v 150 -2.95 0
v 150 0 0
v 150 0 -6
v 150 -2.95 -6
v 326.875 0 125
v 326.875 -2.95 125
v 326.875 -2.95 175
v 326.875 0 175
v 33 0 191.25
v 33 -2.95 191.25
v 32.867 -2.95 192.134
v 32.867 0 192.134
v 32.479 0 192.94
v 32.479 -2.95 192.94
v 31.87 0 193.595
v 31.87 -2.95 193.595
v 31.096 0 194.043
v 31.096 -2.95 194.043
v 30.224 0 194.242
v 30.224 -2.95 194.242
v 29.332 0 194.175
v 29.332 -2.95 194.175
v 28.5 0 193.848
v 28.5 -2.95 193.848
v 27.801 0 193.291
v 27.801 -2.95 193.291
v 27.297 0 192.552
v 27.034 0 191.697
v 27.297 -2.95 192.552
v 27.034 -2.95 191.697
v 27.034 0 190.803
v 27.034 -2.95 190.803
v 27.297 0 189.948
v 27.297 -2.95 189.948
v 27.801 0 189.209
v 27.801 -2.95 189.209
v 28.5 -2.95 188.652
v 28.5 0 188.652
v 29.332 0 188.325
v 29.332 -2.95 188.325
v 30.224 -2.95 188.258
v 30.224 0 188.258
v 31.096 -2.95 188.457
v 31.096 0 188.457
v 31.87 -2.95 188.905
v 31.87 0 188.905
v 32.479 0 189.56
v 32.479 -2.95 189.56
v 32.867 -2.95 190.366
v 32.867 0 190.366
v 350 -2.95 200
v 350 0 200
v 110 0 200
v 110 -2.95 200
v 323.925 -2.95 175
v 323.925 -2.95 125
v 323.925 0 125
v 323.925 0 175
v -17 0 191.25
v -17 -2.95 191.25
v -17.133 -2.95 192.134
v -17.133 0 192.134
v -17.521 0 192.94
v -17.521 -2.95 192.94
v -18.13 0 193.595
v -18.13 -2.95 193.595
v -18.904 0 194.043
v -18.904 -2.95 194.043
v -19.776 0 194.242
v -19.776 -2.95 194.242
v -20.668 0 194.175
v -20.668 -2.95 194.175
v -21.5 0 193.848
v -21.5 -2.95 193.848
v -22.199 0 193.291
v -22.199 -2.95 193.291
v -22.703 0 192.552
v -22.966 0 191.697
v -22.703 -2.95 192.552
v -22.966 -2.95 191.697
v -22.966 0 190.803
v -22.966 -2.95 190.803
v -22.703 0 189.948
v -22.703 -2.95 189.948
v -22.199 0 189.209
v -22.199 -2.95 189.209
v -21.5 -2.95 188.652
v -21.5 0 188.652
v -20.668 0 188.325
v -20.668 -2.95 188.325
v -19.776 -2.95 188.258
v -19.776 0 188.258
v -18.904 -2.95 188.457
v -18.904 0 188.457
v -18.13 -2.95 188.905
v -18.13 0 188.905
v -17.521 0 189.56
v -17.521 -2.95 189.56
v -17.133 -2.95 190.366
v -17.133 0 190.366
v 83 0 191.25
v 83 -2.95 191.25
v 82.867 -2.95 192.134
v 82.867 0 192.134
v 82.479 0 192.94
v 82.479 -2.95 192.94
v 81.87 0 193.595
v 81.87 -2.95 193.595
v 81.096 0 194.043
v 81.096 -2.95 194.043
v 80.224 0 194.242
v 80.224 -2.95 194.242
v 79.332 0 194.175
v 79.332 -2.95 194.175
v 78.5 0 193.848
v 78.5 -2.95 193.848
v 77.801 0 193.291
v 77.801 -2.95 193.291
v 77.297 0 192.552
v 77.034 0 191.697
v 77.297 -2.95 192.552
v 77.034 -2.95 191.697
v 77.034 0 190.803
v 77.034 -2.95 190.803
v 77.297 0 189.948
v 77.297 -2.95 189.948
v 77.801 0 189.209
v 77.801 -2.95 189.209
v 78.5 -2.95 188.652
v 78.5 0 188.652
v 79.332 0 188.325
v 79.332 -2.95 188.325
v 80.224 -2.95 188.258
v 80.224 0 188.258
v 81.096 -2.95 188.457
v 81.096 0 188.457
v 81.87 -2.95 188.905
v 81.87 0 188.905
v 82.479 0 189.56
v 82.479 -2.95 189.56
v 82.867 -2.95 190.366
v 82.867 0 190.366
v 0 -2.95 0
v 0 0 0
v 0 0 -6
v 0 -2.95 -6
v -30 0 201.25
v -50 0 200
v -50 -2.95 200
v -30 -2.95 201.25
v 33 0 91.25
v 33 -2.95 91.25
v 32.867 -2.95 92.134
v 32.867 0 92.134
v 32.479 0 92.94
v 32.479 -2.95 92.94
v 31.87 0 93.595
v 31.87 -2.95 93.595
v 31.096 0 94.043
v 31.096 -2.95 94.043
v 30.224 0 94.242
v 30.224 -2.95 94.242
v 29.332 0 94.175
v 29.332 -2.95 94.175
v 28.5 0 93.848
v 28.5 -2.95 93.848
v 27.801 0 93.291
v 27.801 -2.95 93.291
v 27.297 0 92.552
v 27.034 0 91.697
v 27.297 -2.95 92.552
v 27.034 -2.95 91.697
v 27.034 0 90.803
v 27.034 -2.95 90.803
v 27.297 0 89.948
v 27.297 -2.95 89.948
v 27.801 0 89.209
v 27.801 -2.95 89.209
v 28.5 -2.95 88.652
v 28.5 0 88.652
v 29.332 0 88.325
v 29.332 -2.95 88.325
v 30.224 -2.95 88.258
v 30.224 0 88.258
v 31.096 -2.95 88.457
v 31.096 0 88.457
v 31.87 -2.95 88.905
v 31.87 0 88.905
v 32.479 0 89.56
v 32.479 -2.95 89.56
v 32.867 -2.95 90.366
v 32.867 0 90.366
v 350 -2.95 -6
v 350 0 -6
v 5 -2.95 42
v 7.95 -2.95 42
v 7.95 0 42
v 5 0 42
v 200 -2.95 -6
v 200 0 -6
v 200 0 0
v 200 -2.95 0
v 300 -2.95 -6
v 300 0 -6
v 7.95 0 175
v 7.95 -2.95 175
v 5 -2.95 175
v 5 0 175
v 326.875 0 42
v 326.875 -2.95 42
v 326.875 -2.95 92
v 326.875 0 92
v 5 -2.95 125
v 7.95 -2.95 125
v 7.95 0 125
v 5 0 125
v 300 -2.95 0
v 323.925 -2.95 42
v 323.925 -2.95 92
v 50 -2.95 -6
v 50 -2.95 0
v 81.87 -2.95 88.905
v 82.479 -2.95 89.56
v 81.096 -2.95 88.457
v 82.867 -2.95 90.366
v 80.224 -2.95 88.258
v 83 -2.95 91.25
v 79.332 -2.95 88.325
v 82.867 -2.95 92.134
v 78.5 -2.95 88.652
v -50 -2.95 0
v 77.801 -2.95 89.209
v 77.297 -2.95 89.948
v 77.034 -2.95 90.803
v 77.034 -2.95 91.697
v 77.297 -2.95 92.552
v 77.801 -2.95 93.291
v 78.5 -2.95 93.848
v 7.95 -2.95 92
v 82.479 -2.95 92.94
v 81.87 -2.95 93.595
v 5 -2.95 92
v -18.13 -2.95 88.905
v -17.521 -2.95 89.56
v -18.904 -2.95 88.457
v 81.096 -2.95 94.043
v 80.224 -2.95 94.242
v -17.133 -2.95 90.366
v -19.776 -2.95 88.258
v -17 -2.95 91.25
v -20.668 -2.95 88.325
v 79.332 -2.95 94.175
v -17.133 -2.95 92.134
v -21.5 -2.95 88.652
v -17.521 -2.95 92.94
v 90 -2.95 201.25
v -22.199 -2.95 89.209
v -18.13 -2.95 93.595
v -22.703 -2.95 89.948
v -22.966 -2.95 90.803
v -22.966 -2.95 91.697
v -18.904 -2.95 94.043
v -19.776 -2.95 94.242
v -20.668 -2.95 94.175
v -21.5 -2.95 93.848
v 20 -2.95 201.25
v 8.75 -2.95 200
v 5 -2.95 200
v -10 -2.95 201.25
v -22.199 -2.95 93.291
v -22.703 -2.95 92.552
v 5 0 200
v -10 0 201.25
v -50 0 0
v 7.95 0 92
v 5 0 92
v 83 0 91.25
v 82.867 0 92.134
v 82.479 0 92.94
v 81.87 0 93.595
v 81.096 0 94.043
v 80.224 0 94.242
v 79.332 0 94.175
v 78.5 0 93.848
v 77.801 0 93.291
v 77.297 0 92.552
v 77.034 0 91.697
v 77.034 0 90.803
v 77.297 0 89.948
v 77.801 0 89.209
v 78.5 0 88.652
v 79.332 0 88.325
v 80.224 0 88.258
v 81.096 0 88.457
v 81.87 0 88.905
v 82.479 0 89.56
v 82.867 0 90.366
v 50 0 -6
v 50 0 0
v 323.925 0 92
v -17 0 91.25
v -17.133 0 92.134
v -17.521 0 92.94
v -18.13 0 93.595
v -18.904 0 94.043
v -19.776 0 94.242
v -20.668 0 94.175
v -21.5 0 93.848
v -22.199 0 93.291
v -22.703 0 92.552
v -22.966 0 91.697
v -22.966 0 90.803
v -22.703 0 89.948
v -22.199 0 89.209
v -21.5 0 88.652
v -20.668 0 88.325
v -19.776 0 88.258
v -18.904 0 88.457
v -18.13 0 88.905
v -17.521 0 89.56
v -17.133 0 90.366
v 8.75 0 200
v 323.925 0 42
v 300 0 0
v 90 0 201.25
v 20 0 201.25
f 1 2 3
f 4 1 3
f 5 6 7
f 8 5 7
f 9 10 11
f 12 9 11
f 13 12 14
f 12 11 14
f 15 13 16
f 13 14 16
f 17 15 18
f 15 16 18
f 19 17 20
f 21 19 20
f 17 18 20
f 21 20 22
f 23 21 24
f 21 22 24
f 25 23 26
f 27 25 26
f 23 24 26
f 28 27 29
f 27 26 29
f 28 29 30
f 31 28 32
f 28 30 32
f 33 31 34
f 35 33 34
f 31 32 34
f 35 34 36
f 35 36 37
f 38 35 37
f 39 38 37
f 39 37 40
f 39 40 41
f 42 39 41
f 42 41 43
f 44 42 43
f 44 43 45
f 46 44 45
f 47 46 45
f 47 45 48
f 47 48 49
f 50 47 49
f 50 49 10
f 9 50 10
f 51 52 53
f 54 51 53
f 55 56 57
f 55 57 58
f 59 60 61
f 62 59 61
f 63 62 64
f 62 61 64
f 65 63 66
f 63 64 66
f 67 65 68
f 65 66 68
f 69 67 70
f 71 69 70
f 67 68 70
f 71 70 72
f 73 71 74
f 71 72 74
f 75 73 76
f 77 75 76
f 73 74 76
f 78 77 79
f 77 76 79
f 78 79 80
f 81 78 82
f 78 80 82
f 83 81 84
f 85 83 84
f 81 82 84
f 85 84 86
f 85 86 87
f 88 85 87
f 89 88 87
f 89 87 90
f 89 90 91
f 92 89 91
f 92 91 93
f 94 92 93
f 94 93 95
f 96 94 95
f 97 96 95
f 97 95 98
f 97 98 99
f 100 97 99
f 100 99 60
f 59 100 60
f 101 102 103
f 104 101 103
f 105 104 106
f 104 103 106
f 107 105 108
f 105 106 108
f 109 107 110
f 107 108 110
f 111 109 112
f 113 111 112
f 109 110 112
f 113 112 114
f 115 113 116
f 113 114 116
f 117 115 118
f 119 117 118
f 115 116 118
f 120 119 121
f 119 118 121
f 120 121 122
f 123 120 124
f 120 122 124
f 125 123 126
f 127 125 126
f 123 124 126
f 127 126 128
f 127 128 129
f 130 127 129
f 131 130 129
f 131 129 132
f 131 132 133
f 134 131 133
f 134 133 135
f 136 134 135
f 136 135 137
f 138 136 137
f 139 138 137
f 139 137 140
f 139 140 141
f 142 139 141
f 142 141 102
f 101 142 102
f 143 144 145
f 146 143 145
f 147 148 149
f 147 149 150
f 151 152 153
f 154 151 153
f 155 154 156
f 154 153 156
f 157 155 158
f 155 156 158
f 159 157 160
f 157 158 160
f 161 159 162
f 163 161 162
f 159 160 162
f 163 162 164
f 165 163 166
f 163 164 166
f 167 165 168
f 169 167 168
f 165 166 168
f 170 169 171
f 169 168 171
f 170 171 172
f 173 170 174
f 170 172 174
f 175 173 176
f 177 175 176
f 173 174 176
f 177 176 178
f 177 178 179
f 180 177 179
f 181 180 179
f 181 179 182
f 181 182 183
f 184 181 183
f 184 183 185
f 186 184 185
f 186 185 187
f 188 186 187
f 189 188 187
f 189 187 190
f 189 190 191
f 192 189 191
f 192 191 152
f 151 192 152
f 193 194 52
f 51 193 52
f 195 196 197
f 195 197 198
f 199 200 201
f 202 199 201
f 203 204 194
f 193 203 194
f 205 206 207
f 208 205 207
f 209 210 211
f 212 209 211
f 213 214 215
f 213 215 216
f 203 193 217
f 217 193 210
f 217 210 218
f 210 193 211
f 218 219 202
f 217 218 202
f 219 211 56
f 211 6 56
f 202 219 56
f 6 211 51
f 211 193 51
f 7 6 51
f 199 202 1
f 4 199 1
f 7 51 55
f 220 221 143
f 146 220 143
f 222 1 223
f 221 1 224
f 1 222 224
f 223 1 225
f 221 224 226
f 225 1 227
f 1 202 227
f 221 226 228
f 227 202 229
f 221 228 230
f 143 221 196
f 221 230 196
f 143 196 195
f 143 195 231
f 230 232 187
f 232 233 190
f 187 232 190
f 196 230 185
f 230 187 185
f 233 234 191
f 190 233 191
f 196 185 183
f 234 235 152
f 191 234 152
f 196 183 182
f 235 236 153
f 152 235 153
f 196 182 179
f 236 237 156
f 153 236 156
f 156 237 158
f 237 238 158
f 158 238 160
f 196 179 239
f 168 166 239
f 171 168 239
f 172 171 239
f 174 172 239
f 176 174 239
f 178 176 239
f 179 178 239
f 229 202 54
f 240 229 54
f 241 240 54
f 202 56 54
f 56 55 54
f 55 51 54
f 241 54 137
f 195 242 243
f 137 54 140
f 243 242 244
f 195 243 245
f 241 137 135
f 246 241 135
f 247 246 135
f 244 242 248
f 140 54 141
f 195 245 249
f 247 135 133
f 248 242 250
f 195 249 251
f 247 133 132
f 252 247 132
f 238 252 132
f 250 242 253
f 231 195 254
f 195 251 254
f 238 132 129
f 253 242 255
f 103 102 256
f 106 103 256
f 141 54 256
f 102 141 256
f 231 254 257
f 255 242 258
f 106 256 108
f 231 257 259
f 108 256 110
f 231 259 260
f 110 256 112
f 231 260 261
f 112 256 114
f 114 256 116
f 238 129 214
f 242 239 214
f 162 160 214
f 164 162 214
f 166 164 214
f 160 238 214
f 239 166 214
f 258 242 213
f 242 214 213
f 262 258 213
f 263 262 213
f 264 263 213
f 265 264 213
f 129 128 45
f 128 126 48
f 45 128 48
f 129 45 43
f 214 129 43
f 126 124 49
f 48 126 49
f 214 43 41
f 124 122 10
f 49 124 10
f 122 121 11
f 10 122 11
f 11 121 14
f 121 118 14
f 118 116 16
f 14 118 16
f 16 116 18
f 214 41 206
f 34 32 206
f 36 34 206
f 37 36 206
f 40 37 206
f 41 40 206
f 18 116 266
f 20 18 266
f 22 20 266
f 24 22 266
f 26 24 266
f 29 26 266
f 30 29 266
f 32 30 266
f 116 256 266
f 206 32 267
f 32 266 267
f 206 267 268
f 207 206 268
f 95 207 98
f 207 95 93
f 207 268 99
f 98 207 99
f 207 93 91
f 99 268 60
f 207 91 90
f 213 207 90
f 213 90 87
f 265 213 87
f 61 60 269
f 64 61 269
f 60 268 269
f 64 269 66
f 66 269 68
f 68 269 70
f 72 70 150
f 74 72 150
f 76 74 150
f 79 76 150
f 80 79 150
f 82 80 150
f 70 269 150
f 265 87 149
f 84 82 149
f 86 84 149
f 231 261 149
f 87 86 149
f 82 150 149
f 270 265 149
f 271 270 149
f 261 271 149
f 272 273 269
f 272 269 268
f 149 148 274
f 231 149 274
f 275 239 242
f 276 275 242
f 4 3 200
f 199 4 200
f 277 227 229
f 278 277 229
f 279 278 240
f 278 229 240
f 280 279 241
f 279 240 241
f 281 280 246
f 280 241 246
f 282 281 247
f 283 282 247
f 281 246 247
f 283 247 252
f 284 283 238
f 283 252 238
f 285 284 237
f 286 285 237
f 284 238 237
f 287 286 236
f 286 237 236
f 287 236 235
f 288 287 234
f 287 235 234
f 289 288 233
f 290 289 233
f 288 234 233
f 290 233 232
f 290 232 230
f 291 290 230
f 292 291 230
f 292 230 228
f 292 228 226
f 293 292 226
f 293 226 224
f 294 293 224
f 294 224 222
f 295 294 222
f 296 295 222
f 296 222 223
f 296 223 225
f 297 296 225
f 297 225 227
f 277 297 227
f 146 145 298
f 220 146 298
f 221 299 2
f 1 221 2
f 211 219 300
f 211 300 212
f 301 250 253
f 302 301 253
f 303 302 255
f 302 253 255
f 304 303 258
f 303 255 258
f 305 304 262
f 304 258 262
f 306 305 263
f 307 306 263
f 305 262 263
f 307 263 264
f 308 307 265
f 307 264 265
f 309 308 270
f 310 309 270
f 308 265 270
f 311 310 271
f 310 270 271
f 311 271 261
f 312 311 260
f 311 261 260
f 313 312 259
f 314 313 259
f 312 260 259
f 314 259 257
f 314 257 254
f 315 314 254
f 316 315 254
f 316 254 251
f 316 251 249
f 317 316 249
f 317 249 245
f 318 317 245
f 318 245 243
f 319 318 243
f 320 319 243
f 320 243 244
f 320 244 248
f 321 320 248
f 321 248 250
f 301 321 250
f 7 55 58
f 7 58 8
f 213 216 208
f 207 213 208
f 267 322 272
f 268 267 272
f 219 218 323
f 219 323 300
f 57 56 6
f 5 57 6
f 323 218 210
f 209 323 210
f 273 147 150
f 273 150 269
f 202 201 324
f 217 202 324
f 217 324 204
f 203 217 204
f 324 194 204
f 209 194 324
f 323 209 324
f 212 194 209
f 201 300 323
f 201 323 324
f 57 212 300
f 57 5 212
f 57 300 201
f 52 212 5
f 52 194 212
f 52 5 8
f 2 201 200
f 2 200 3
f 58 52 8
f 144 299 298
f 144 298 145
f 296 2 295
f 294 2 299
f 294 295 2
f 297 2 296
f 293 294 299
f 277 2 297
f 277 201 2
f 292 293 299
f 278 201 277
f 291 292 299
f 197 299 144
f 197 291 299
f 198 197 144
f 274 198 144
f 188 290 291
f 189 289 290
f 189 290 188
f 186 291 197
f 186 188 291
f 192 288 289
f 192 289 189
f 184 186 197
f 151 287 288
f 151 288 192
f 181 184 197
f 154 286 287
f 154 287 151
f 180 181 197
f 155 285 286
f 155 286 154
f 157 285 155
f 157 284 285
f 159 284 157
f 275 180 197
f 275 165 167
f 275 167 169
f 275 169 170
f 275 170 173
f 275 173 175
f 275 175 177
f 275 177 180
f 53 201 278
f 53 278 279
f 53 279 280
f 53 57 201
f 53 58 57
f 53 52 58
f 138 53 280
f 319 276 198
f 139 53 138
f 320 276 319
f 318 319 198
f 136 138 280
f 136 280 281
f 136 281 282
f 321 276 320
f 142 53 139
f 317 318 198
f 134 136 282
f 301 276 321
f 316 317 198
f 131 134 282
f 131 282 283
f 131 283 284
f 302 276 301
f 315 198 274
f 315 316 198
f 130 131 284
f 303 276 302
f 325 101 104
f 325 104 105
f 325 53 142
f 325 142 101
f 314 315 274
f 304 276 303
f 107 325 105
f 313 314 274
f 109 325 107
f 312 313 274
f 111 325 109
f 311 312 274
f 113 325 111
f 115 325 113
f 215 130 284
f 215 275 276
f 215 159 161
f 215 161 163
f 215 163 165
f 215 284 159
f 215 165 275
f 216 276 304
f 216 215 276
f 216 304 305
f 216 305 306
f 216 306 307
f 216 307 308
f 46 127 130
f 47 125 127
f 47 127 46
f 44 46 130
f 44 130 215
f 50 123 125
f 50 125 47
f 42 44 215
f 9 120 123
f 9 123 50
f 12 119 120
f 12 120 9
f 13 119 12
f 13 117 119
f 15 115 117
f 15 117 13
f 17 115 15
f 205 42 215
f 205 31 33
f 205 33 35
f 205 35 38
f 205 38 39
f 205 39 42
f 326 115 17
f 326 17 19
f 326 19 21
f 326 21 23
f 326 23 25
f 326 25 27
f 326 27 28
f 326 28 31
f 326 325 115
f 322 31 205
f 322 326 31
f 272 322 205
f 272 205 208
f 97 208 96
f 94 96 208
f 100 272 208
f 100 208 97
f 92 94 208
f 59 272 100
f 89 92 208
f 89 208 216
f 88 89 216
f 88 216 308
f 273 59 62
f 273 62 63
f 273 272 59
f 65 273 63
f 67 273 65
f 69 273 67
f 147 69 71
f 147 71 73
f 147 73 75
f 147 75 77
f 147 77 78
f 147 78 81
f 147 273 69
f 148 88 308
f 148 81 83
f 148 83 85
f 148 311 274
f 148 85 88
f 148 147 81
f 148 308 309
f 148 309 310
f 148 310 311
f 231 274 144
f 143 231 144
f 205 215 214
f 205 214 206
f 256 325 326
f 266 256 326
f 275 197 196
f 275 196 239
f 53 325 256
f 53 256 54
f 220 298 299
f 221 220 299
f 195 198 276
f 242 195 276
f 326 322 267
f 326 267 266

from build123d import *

# Parameters (mm, degrees)
F1_DEPTH  = 2.95
F2_W      = 2.95
F2_H      = 50
F3_DEPTH  = 2.95
F4_W      = 20
F4_H      = 2.95
F5_DEPTH  = 1.25
F7_D      = 6
F7_DEPTH  = 4
F7_TIP    = 1.8025818571
F8_W      = 30
F8_H      = 1.25
F9_DEPTH  = 2.95
F10_W     = 2.95
F10_H     = 50
F11_DEPTH = 2.95


# Not quite as in the source:
# - a feature names something its author has since deleted; it is built from what else it names


with BuildPart() as f1:
    # F0 (on Front) → F1 (new body)
    with BuildSketch(Plane.XZ):
        Polygon((50, -6), (50, 0), (150, 0), (150, -6), (200, -6), (200, 0), (300, 0), (300, -6), (350, -6), (350, 0), (350, 200), (0, 200), (-50, 200), (-50, 0), (0, 0), (0, -6), align=None)
    extrude(amount=F1_DEPTH)

    # F2 (on face) → F3 (cut)
    with BuildSketch(Plane.XZ.offset(2.95)):
        with Locations((325.4, 150)):
            Rectangle(F2_W, F2_H)
        with Locations((325.4, 67)):
            Rectangle(F2_W, F2_H)
    extrude(amount=-F3_DEPTH, mode=Mode.SUBTRACT)

    # F4 (on face) → F5 (join)
    with BuildSketch(Plane.XY.offset(200)):
        with Locations((80, -1.475)):
            Rectangle(F4_W, F4_H)
        with Locations((30, -1.475)):
            Rectangle(F4_W, F4_H)
        with Locations((-20, -1.475)):
            Rectangle(F4_W, F4_H)
    extrude(amount=F5_DEPTH)

    # F7
    with Locations(Plane(origin=(0, 0, 0), x_dir=(-1, 0, 0), z_dir=(0, 1, 0))):
        with Locations((-80, 91.25), (-80, 191.25), (-30, 91.25), (20, 91.25), (20, 191.25), (-30, 191.25)):
            Hole(F7_D / 2, depth=F7_DEPTH)
            with Locations((0, 0, -(F7_DEPTH + F7_TIP / 2))):  # 118° drill point
                Cone(0, F7_D / 2, F7_TIP, mode=Mode.SUBTRACT)

    # F8 (on face) → F9 (join)
    with BuildSketch(Plane(origin=(0, 0, 0), x_dir=(-1, 0, 0), z_dir=(0, 1, 0))):
        with Locations((-55, 200.625)):
            Rectangle(F8_W, F8_H)
        Polygon((30, 201.25), (30, 200), (50, 200), align=None)
        Polygon((-90, 200), (-90, 201.25), (-110, 200), align=None)
        Polygon((10, 201.25), (-5, 200), (10, 200), align=None)
        Polygon((-8.75, 200), (-20, 201.25), (-20, 200), align=None)
    extrude(amount=-F9_DEPTH)

    # F10 (on face) → F11 (cut)
    with BuildSketch(Plane(origin=(0, 0, 0), x_dir=(-1, 0, 0), z_dir=(0, 1, 0))):
        with Locations((-6.475, 150)):
            Rectangle(F10_W, F10_H)
        with Locations((-6.475, 67)):
            Rectangle(F10_W, F10_H)
    extrude(amount=-F11_DEPTH, mode=Mode.SUBTRACT)


solid = f1.part
